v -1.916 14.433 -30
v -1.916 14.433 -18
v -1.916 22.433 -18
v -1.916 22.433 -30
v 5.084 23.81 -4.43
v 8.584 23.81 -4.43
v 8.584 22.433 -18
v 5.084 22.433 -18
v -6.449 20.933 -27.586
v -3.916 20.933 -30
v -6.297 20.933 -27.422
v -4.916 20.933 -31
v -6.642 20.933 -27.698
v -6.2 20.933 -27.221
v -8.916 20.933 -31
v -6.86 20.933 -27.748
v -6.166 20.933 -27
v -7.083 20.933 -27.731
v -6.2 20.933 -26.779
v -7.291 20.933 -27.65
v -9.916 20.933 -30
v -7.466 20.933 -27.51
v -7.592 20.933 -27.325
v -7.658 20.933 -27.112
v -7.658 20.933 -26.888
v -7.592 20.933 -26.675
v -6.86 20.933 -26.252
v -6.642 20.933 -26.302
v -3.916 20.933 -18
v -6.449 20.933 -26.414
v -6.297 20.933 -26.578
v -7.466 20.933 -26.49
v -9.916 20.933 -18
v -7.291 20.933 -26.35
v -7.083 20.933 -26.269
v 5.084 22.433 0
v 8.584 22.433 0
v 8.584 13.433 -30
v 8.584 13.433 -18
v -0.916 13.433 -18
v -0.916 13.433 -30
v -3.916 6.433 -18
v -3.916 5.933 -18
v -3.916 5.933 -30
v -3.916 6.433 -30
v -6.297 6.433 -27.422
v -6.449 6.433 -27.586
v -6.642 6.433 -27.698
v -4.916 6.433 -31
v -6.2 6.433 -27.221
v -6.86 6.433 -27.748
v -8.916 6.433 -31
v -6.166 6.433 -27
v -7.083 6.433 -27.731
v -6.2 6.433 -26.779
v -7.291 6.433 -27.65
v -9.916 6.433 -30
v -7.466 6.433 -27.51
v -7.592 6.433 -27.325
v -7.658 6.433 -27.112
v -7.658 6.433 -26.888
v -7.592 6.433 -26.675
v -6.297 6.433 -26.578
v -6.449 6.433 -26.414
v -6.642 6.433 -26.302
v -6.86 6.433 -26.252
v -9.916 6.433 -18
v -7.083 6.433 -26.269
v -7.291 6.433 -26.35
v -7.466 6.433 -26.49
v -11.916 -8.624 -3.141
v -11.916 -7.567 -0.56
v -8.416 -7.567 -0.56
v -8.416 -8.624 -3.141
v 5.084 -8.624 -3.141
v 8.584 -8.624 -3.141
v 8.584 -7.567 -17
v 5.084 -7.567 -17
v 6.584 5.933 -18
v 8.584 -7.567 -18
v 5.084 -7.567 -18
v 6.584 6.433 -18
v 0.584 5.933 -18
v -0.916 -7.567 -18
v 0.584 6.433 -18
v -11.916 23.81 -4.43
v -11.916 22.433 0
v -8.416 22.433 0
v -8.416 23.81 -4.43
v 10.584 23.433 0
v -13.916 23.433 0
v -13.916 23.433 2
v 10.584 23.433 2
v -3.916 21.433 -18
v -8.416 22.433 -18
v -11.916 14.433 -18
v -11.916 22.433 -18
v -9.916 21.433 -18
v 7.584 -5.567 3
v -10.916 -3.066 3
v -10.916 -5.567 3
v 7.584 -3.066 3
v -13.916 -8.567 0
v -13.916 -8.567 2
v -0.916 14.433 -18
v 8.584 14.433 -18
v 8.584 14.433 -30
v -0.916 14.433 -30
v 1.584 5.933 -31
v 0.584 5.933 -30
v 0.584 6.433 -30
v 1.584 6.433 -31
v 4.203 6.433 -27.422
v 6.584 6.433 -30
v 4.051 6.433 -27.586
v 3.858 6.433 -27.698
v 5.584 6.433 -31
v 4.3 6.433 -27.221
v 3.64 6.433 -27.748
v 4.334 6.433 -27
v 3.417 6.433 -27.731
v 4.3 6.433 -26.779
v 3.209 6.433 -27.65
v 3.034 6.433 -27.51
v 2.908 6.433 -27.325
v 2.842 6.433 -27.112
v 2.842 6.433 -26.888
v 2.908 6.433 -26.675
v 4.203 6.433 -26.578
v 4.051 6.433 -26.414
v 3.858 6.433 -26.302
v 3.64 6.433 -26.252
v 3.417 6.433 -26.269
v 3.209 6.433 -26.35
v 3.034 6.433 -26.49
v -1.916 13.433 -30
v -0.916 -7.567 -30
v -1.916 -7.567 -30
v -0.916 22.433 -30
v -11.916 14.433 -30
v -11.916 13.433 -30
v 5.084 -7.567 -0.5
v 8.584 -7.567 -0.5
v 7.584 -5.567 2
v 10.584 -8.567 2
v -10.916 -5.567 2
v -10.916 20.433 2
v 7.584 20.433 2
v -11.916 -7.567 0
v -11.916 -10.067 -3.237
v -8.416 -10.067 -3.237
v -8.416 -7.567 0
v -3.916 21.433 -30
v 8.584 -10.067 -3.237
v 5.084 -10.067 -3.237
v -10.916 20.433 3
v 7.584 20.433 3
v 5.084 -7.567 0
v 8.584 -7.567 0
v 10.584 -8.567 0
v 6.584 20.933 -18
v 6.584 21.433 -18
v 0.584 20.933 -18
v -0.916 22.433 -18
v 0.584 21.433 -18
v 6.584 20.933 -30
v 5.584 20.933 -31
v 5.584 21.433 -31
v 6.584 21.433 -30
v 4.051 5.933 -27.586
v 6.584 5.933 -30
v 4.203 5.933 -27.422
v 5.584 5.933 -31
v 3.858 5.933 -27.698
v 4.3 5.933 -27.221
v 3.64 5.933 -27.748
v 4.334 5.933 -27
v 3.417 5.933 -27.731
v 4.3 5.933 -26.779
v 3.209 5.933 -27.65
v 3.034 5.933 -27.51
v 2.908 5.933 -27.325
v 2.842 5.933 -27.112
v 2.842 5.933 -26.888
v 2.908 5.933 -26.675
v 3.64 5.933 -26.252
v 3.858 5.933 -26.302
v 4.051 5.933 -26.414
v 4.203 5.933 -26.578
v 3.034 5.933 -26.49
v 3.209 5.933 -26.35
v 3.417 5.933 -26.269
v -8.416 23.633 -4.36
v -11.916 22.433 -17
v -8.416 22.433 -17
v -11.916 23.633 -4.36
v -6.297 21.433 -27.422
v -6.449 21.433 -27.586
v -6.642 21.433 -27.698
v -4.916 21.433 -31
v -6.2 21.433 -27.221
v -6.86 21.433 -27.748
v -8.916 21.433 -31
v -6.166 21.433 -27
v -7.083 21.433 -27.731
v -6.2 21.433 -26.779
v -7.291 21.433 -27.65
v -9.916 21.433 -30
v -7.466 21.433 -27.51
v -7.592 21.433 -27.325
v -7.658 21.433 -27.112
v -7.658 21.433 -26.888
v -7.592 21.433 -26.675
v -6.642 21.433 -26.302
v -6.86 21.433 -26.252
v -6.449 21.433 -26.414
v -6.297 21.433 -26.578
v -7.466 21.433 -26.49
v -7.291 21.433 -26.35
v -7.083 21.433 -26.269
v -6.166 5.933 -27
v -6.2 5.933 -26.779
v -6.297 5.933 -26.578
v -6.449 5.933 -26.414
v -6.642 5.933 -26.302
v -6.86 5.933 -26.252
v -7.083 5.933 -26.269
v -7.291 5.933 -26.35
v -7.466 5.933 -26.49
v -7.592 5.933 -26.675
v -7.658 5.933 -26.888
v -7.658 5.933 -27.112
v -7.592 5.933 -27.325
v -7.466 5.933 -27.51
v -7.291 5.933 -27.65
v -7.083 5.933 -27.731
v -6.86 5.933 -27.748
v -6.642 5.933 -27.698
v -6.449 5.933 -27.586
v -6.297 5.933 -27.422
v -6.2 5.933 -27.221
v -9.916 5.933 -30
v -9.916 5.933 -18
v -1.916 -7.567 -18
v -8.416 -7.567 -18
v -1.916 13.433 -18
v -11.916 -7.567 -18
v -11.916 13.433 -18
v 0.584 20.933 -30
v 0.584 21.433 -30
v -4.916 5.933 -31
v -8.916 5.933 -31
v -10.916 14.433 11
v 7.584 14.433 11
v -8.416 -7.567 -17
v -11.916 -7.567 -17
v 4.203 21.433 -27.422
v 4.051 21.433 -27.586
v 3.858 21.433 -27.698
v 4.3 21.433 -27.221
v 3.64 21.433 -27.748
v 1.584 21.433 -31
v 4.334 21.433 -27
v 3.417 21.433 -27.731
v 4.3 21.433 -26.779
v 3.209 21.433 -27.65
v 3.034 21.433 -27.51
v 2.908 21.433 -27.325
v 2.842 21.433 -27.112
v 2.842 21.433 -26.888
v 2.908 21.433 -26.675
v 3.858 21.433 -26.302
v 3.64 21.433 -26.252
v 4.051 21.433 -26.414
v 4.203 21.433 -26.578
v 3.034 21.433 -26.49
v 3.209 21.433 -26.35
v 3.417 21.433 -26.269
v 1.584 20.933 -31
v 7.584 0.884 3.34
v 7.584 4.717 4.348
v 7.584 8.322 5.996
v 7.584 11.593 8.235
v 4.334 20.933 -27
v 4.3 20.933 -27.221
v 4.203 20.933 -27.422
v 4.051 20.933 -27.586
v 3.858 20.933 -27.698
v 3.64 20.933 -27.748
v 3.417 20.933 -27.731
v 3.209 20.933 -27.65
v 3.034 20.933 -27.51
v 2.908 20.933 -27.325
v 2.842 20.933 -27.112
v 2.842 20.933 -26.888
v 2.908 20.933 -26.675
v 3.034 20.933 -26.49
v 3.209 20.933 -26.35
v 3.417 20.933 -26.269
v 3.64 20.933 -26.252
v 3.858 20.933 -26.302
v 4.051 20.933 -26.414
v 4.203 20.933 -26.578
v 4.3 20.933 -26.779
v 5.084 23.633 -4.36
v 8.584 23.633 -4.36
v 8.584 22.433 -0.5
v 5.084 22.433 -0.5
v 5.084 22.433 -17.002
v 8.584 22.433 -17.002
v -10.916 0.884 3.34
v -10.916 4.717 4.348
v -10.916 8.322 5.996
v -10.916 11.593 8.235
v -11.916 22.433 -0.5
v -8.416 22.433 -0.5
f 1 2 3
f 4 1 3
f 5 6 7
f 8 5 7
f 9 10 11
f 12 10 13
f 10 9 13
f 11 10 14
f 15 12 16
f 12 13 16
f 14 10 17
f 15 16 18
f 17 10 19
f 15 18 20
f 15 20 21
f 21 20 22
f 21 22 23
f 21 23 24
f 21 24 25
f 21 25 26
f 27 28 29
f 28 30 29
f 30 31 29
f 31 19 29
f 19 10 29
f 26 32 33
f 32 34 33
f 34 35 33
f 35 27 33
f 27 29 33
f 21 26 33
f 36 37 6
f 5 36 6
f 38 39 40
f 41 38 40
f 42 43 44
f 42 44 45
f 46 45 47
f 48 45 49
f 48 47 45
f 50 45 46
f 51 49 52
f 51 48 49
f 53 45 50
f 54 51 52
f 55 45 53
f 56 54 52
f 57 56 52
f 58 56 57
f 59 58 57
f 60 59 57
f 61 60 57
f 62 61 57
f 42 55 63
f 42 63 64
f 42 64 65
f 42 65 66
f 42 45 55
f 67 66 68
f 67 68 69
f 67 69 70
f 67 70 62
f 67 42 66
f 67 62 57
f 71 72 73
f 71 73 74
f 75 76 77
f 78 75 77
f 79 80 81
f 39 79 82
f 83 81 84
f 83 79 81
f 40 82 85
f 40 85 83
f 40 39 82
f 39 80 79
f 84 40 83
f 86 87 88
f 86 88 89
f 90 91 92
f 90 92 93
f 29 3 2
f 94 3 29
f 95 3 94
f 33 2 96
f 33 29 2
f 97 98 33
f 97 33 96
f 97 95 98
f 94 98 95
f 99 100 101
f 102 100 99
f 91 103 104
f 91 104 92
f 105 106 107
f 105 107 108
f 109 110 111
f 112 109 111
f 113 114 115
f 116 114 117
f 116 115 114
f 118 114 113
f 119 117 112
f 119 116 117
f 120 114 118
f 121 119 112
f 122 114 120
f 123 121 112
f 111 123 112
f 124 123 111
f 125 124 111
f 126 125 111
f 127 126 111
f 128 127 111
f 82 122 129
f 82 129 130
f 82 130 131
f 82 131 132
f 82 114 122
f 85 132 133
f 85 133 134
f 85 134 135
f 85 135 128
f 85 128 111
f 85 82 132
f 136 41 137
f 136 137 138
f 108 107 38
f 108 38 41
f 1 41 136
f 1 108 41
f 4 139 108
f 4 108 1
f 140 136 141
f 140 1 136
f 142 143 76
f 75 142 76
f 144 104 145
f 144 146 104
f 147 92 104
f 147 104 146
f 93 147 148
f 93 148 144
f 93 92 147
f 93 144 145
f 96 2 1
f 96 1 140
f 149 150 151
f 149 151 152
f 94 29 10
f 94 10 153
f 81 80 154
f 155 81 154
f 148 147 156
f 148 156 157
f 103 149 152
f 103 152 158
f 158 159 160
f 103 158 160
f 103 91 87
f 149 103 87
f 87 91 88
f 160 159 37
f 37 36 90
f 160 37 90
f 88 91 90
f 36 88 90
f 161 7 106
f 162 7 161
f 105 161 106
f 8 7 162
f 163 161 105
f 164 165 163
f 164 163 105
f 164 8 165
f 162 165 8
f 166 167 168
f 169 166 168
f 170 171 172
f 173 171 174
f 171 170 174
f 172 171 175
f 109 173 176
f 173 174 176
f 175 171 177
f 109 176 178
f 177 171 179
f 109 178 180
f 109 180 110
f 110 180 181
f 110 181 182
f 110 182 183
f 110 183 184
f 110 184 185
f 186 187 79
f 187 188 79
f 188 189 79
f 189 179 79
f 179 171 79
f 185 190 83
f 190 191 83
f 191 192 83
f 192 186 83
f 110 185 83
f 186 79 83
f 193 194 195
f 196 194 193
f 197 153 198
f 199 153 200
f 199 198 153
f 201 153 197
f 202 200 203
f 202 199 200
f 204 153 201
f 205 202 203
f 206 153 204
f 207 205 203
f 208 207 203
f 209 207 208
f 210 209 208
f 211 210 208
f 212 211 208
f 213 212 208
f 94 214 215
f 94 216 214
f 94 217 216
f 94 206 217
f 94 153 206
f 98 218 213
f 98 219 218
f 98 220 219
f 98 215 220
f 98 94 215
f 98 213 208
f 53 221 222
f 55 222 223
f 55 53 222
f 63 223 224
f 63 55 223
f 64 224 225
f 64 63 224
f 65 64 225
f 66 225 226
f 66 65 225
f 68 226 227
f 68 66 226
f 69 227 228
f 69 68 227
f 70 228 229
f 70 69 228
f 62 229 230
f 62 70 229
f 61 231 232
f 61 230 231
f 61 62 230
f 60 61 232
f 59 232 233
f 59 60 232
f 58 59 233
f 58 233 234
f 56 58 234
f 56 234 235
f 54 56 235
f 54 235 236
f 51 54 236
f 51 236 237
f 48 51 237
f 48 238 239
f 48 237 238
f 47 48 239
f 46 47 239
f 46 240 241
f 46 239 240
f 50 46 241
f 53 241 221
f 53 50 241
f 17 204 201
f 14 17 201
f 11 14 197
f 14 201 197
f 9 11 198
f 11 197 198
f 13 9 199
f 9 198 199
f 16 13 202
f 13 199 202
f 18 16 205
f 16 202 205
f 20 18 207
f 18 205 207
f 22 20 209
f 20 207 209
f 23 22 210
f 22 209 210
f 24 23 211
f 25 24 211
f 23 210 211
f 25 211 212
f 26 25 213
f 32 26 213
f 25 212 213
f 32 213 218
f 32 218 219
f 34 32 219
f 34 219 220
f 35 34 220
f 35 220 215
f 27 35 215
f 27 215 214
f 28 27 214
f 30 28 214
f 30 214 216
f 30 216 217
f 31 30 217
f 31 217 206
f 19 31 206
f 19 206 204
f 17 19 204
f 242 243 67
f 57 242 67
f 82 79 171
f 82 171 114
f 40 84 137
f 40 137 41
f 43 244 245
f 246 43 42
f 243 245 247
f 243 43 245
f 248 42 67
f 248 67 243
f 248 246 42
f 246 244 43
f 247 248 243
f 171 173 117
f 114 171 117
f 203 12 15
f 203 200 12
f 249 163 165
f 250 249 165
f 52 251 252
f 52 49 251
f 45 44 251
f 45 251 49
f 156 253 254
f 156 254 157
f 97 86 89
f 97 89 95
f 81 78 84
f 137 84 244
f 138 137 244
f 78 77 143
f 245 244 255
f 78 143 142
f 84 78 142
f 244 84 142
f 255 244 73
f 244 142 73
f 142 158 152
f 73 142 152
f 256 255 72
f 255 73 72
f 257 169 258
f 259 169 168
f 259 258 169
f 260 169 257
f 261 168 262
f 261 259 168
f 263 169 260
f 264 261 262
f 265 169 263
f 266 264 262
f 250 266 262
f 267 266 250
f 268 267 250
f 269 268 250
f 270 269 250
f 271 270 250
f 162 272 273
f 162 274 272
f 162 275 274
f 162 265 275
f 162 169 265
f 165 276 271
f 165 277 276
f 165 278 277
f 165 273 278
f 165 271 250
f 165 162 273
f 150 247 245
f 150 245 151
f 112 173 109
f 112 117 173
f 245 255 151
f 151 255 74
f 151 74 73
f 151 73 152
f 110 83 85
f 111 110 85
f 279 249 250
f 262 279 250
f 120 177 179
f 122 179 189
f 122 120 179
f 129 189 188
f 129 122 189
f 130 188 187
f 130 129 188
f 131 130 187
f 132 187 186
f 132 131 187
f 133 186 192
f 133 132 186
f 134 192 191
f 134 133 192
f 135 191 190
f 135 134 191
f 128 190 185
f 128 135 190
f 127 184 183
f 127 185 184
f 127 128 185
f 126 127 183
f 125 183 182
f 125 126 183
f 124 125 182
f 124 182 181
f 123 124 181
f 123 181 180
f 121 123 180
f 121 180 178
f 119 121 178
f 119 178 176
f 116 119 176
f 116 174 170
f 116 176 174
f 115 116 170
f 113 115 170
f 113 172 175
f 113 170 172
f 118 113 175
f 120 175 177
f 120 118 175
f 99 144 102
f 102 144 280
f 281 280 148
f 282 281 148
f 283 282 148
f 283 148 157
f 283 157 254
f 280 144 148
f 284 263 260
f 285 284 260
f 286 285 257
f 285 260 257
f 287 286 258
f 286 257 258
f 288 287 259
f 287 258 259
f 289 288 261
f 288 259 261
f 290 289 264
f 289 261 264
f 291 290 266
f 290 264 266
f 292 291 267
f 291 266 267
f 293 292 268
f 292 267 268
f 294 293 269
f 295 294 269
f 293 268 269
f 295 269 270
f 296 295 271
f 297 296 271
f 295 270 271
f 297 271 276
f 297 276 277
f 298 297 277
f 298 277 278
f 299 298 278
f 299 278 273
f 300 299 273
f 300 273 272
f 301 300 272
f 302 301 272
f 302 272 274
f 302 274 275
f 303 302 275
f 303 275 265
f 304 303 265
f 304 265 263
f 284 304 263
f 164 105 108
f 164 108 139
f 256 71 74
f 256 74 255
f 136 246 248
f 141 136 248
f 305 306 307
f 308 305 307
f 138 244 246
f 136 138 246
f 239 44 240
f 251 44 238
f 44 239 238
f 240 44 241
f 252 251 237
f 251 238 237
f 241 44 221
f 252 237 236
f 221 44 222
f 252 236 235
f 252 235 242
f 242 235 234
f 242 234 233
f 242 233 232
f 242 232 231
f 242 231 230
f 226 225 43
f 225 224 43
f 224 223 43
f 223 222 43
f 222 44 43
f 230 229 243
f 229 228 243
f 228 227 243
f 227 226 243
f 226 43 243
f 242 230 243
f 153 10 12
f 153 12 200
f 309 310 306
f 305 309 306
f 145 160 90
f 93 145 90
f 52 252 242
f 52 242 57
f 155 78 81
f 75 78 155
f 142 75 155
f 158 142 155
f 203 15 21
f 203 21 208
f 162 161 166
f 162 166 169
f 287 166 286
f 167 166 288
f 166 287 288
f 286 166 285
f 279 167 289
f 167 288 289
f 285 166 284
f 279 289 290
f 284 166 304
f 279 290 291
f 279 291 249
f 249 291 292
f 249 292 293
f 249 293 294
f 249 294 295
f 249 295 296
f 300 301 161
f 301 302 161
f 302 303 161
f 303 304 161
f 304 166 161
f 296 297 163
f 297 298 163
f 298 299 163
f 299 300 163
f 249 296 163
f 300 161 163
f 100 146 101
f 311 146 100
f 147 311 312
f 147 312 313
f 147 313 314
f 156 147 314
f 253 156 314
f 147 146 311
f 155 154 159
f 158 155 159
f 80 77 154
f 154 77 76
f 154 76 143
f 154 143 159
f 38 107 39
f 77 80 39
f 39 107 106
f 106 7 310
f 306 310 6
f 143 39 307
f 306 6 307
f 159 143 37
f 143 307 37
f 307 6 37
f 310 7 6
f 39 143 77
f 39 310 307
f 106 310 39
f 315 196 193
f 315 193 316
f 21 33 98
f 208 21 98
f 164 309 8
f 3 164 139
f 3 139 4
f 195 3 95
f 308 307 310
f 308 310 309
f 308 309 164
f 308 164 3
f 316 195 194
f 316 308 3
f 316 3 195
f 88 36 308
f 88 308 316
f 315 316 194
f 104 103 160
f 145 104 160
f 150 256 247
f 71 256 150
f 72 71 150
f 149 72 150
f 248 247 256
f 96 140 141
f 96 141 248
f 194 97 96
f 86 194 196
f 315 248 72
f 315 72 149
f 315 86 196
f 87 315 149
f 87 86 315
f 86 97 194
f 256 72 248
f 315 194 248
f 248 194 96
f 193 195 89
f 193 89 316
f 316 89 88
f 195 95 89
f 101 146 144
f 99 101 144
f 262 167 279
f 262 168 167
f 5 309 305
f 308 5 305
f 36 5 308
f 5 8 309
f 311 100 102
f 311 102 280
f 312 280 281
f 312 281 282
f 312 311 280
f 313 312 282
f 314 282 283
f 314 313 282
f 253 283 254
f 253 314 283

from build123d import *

# Parameters (mm, degrees)
SKETCH1_W                = 24.5
SKETCH1_H                = 32
EXTRUDE2_DEPTH           = 2
SKETCH2_W                = 20.5
SKETCH2_H                = 30
EXTRUDE3_DEPTH           = 18
SKETCH4_W                = 18.5
SKETCH4_H                = 26
EXTRUDE7_DEPTH           = 1
EXTRUDE8_DEPTH           = 18.5
EXTRUDE9_DEPTH           = 3.5
EXTRUDE10_DEPTH          = 3.5
EXTRUDE11_DEPTH          = 3.5
EXTRUDE12_DEPTH          = 3.5
SKETCH10_W               = 1
SKETCH10_H               = 30
EXTRUDE13_DEPTH          = 12
SKETCH11_W               = 9.5
SKETCH11_H               = 1
SKETCH11_W_2             = 10
EXTRUDE14_DEPTH          = 12
SKETCH12_W               = 6
SKETCH12_H               = 0.5
EXTRUDE15_DEPTH          = 13
CHAMFER1_SIZE            = 1
SKETCH14_R               = 0.75
CUT_EXTRUDE2_DEPTH       = 1
TAGLIO_ESTRUSIONE1_REACH = 18.5
SKETCH13_R               = 0.75


with BuildPart() as part:
    # Sketch1 → Extrude2 (new body)
    with BuildSketch(Plane.XY):
        with Locations((-1.666405536, 7.433431257)):
            Rectangle(SKETCH1_W, SKETCH1_H)
    extrude(amount=EXTRUDE2_DEPTH)

    # Sketch2 → Extrude3 (add)
    with BuildSketch(Plane(origin=(0, 0, 0), x_dir=(-1, 0, 0), z_dir=(0, 0, -1))):
        with Locations((1.666405536, 7.433431257)):
            Rectangle(SKETCH2_W, SKETCH2_H)
    extrude(amount=EXTRUDE3_DEPTH)

    # Sketch4 → Extrude7 (add)
    with BuildSketch(Plane.XY.offset(2)):
        with Locations((-1.666405536, 7.433431257)):
            Rectangle(SKETCH4_W, SKETCH4_H)
    extrude(amount=EXTRUDE7_DEPTH)

    # Sketch5 → Extrude8 (add)
    with BuildSketch(Plane.ZY.offset(10.916405536)):
        with BuildLine():
            Line((3, 20.433431257), (3, -3.065691745))
            ThreePointArc((3, -3.065691745), (5.094825857, 6.554850155), (11, 14.433431257))
            Line((11, 14.433431257), (3, 20.433431257))
        make_face()
    extrude(amount=-EXTRUDE8_DEPTH)

    # Sketch6 → Extrude9 (add)
    with BuildSketch(Plane.ZY.offset(11.916405536)):
        Polygon((-18, 22.433431257), (-17, 22.433431257), (-4.359704833, 23.632529834), (-0.5, 22.433431257), (0, 22.433431257), (-4.430049233, 23.809719331), align=None)
    extrude(amount=-EXTRUDE9_DEPTH)

    # Sketch7 → Extrude10 (add)
    with BuildSketch(Plane(origin=(8.583594464, 0, 0), x_dir=(0, 0, -1), z_dir=(1, 0, 0))):
        Polygon((18, 22.433431257), (17.001667285, 22.433431257), (4.359704833, 23.632529834), (0.5, 22.433431257), (0, 22.433431257), (4.430049233, 23.809719331), align=None)
    extrude(amount=-EXTRUDE10_DEPTH)

    # Sketch8 → Extrude11 (add)
    with BuildSketch(Plane(origin=(8.583594464, 0, 0), x_dir=(0, 0, -1), z_dir=(1, 0, 0))):
        Polygon((0, -7.566568743), (0.5, -7.566568743), (3.14109092, -8.623937135), (17, -7.566568743), (18, -7.566568743), (3.237476094, -10.066568743), align=None)
    extrude(amount=-EXTRUDE11_DEPTH)

    # Sketch9 → Extrude12 (add)
    with BuildSketch(Plane.ZY.offset(11.916405536)):
        Polygon((0, -7.566568743), (-0.56008941, -7.566568743), (-3.14109092, -8.623937135), (-17, -7.566568743), (-18, -7.566568743), (-3.237476094, -10.066568743), align=None)
    extrude(amount=-EXTRUDE12_DEPTH)

    # Sketch10 → Extrude13 (add)
    with BuildSketch(Plane(origin=(0, 0, -18), x_dir=(-1, 0, 0), z_dir=(0, 0, -1))):
        with Locations((1.416405536, 7.433431257)):
            Rectangle(SKETCH10_W, SKETCH10_H)
    extrude(amount=EXTRUDE13_DEPTH)

    # Sketch11 → Extrude14 (add)
    with BuildSketch(Plane(origin=(0, 0, -18), x_dir=(-1, 0, 0), z_dir=(0, 0, -1))):
        with Locations((-3.833594464, 13.933431257)):
            Rectangle(SKETCH11_W, SKETCH11_H)
        with Locations((6.916405536, 13.933431257)):
            Rectangle(SKETCH11_W_2, SKETCH11_H)
    extrude(amount=EXTRUDE14_DEPTH)

    # Sketch12 → Extrude15 (add)
    with BuildSketch(Plane(origin=(0, 0, -18), x_dir=(-1, 0, 0), z_dir=(0, 0, -1))):
        with Locations((-3.583594464, 21.183431257)):
            Rectangle(SKETCH12_W, SKETCH12_H)
        with Locations((6.916405536, 21.183431257)):
            Rectangle(SKETCH12_W, SKETCH12_H)
        with Locations((-3.583594464, 6.183431257)):
            Rectangle(SKETCH12_W, SKETCH12_H)
        with Locations((6.916405536, 6.183431257)):
            Rectangle(SKETCH12_W, SKETCH12_H)
    extrude(amount=EXTRUDE15_DEPTH)

    # Chamfer1
    chamfer1_edges = [part.edges().sort_by_distance(p)[0] for p in [
        (6.583594464, 21.183431257, -31),
        (0.583594464, 21.183431257, -31),
        (-3.916405536, 21.183431257, -31),
        (-9.916405536, 21.183431257, -31),
        (6.583594464, 6.183431257, -31),
        (0.583594464, 6.183431257, -31),
        (-3.916405536, 6.183431257, -31),
        (-9.916405536, 6.183431257, -31),
    ]]
    chamfer(chamfer1_edges, length=CHAMFER1_SIZE)

    # Sketch14 → Cut-Extrude2 (cut)
    with BuildSketch(Plane(origin=(0, 21.433431257, 0), x_dir=(1, 0, 0), z_dir=(0, 1, 0))):
        with Locations((-6.916405536, 27)):
            Circle(SKETCH14_R)
        with Locations((3.583594464, 27)):
            Circle(SKETCH14_R)
    extrude(amount=-CUT_EXTRUDE2_DEPTH, mode=Mode.SUBTRACT)

    # Sketch13 → Taglio-Estrusione1 (cut, up to next)
    with BuildSketch(Plane.XZ.offset(-6.433431257), mode=Mode.PRIVATE) as taglio_estrusione1_sk1:
        with Locations((-6.916405536, -27)):
            Circle(SKETCH13_R)
    taglio_estrusione1_tool1 = extrude(taglio_estrusione1_sk1.sketch, amount=TAGLIO_ESTRUSIONE1_REACH, mode=Mode.PRIVATE) & part.part
    add(taglio_estrusione1_tool1.solids().sort_by_distance((-6.916406, 6.433431, -27))[0], mode=Mode.SUBTRACT)
    # Sketch13 → Taglio-Estrusione1 (cut, up to next)
    with BuildSketch(Plane.XZ.offset(-6.433431257), mode=Mode.PRIVATE) as taglio_estrusione1_sk2:
        with Locations((3.583594464, -27)):
            Circle(SKETCH13_R)
    taglio_estrusione1_tool2 = extrude(taglio_estrusione1_sk2.sketch, amount=TAGLIO_ESTRUSIONE1_REACH, mode=Mode.PRIVATE) & part.part
    add(taglio_estrusione1_tool2.solids().sort_by_distance((3.583594, 6.433431, -27))[0], mode=Mode.SUBTRACT)


solid = part.part
